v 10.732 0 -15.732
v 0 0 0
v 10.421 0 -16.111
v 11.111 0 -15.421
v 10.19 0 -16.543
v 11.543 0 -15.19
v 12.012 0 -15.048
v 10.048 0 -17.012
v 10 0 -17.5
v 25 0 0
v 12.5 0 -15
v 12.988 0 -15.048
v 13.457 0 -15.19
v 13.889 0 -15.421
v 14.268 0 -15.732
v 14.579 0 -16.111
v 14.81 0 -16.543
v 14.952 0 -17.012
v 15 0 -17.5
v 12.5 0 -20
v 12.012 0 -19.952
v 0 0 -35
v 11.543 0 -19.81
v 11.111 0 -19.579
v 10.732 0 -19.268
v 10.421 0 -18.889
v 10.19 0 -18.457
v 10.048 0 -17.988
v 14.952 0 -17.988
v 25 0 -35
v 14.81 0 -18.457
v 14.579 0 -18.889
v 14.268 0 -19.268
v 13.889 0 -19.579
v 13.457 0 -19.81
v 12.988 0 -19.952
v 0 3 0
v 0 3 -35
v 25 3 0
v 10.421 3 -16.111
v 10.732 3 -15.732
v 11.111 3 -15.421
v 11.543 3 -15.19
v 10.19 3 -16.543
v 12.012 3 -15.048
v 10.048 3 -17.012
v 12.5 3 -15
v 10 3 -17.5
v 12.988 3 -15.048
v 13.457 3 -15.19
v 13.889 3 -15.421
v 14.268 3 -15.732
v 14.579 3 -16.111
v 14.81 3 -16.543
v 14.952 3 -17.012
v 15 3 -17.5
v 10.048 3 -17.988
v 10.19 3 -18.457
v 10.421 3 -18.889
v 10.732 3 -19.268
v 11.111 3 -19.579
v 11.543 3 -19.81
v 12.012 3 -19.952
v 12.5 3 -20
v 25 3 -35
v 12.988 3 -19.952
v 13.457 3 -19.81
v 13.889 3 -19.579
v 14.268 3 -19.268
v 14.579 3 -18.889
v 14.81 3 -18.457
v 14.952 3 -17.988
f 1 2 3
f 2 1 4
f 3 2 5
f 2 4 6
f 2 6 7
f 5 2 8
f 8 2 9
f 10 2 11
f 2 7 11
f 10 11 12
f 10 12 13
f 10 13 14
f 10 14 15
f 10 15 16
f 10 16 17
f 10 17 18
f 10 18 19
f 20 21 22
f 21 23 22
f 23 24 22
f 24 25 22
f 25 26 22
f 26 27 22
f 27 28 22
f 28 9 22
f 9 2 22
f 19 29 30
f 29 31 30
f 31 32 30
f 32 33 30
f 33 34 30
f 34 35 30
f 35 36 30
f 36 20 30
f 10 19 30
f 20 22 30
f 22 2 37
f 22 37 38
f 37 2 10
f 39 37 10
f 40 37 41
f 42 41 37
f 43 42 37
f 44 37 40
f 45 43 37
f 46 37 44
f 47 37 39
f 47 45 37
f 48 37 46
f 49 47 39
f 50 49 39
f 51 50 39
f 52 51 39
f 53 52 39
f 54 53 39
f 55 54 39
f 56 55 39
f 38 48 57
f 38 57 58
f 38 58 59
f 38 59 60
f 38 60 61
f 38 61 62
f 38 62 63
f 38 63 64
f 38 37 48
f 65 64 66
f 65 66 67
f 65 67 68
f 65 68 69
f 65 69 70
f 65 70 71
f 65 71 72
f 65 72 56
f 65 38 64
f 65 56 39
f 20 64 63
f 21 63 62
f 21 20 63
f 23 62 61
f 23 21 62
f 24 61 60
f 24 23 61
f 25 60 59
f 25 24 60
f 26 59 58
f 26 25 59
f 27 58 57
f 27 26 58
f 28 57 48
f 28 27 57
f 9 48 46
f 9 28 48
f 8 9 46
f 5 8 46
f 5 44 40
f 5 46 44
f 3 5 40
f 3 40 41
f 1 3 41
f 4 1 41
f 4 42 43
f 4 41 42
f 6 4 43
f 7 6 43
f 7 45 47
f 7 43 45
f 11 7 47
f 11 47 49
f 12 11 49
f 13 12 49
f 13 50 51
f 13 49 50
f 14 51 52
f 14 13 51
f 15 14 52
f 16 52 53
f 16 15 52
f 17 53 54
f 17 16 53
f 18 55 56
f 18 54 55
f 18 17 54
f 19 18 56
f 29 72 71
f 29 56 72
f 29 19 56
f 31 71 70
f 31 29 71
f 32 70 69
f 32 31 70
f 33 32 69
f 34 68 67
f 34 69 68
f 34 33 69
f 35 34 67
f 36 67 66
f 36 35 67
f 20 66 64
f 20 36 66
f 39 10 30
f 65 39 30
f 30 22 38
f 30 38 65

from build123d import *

# Parameters (mm, degrees)
SKETCH1_W           = 25
SKETCH1_H           = 35
BOSS_EXTRUDE1_DEPTH = 3
SKETCH2_R           = 2.5
CUT_EXTRUDE1_DEPTH  = 12


with BuildPart() as part:
    # Sketch1 → Boss-Extrude1 (new body)
    with BuildSketch(Plane(origin=(0, 0, 0), x_dir=(1, 0, 0), z_dir=(0, 1, 0))):
        with Locations((12.5, 17.5)):
            Rectangle(SKETCH1_W, SKETCH1_H)
    extrude(amount=BOSS_EXTRUDE1_DEPTH)

    # Sketch2 → Cut-Extrude1 (cut)
    with BuildSketch(Plane(origin=(0, 0, 0), x_dir=(1, 0, 0), z_dir=(0, 1, 0))):
        with Locations(Location((12.5, 17.5, 0), (0, 0, 90))):
            Circle(SKETCH2_R)
    extrude(amount=CUT_EXTRUDE1_DEPTH, mode=Mode.SUBTRACT)


solid = part.part
